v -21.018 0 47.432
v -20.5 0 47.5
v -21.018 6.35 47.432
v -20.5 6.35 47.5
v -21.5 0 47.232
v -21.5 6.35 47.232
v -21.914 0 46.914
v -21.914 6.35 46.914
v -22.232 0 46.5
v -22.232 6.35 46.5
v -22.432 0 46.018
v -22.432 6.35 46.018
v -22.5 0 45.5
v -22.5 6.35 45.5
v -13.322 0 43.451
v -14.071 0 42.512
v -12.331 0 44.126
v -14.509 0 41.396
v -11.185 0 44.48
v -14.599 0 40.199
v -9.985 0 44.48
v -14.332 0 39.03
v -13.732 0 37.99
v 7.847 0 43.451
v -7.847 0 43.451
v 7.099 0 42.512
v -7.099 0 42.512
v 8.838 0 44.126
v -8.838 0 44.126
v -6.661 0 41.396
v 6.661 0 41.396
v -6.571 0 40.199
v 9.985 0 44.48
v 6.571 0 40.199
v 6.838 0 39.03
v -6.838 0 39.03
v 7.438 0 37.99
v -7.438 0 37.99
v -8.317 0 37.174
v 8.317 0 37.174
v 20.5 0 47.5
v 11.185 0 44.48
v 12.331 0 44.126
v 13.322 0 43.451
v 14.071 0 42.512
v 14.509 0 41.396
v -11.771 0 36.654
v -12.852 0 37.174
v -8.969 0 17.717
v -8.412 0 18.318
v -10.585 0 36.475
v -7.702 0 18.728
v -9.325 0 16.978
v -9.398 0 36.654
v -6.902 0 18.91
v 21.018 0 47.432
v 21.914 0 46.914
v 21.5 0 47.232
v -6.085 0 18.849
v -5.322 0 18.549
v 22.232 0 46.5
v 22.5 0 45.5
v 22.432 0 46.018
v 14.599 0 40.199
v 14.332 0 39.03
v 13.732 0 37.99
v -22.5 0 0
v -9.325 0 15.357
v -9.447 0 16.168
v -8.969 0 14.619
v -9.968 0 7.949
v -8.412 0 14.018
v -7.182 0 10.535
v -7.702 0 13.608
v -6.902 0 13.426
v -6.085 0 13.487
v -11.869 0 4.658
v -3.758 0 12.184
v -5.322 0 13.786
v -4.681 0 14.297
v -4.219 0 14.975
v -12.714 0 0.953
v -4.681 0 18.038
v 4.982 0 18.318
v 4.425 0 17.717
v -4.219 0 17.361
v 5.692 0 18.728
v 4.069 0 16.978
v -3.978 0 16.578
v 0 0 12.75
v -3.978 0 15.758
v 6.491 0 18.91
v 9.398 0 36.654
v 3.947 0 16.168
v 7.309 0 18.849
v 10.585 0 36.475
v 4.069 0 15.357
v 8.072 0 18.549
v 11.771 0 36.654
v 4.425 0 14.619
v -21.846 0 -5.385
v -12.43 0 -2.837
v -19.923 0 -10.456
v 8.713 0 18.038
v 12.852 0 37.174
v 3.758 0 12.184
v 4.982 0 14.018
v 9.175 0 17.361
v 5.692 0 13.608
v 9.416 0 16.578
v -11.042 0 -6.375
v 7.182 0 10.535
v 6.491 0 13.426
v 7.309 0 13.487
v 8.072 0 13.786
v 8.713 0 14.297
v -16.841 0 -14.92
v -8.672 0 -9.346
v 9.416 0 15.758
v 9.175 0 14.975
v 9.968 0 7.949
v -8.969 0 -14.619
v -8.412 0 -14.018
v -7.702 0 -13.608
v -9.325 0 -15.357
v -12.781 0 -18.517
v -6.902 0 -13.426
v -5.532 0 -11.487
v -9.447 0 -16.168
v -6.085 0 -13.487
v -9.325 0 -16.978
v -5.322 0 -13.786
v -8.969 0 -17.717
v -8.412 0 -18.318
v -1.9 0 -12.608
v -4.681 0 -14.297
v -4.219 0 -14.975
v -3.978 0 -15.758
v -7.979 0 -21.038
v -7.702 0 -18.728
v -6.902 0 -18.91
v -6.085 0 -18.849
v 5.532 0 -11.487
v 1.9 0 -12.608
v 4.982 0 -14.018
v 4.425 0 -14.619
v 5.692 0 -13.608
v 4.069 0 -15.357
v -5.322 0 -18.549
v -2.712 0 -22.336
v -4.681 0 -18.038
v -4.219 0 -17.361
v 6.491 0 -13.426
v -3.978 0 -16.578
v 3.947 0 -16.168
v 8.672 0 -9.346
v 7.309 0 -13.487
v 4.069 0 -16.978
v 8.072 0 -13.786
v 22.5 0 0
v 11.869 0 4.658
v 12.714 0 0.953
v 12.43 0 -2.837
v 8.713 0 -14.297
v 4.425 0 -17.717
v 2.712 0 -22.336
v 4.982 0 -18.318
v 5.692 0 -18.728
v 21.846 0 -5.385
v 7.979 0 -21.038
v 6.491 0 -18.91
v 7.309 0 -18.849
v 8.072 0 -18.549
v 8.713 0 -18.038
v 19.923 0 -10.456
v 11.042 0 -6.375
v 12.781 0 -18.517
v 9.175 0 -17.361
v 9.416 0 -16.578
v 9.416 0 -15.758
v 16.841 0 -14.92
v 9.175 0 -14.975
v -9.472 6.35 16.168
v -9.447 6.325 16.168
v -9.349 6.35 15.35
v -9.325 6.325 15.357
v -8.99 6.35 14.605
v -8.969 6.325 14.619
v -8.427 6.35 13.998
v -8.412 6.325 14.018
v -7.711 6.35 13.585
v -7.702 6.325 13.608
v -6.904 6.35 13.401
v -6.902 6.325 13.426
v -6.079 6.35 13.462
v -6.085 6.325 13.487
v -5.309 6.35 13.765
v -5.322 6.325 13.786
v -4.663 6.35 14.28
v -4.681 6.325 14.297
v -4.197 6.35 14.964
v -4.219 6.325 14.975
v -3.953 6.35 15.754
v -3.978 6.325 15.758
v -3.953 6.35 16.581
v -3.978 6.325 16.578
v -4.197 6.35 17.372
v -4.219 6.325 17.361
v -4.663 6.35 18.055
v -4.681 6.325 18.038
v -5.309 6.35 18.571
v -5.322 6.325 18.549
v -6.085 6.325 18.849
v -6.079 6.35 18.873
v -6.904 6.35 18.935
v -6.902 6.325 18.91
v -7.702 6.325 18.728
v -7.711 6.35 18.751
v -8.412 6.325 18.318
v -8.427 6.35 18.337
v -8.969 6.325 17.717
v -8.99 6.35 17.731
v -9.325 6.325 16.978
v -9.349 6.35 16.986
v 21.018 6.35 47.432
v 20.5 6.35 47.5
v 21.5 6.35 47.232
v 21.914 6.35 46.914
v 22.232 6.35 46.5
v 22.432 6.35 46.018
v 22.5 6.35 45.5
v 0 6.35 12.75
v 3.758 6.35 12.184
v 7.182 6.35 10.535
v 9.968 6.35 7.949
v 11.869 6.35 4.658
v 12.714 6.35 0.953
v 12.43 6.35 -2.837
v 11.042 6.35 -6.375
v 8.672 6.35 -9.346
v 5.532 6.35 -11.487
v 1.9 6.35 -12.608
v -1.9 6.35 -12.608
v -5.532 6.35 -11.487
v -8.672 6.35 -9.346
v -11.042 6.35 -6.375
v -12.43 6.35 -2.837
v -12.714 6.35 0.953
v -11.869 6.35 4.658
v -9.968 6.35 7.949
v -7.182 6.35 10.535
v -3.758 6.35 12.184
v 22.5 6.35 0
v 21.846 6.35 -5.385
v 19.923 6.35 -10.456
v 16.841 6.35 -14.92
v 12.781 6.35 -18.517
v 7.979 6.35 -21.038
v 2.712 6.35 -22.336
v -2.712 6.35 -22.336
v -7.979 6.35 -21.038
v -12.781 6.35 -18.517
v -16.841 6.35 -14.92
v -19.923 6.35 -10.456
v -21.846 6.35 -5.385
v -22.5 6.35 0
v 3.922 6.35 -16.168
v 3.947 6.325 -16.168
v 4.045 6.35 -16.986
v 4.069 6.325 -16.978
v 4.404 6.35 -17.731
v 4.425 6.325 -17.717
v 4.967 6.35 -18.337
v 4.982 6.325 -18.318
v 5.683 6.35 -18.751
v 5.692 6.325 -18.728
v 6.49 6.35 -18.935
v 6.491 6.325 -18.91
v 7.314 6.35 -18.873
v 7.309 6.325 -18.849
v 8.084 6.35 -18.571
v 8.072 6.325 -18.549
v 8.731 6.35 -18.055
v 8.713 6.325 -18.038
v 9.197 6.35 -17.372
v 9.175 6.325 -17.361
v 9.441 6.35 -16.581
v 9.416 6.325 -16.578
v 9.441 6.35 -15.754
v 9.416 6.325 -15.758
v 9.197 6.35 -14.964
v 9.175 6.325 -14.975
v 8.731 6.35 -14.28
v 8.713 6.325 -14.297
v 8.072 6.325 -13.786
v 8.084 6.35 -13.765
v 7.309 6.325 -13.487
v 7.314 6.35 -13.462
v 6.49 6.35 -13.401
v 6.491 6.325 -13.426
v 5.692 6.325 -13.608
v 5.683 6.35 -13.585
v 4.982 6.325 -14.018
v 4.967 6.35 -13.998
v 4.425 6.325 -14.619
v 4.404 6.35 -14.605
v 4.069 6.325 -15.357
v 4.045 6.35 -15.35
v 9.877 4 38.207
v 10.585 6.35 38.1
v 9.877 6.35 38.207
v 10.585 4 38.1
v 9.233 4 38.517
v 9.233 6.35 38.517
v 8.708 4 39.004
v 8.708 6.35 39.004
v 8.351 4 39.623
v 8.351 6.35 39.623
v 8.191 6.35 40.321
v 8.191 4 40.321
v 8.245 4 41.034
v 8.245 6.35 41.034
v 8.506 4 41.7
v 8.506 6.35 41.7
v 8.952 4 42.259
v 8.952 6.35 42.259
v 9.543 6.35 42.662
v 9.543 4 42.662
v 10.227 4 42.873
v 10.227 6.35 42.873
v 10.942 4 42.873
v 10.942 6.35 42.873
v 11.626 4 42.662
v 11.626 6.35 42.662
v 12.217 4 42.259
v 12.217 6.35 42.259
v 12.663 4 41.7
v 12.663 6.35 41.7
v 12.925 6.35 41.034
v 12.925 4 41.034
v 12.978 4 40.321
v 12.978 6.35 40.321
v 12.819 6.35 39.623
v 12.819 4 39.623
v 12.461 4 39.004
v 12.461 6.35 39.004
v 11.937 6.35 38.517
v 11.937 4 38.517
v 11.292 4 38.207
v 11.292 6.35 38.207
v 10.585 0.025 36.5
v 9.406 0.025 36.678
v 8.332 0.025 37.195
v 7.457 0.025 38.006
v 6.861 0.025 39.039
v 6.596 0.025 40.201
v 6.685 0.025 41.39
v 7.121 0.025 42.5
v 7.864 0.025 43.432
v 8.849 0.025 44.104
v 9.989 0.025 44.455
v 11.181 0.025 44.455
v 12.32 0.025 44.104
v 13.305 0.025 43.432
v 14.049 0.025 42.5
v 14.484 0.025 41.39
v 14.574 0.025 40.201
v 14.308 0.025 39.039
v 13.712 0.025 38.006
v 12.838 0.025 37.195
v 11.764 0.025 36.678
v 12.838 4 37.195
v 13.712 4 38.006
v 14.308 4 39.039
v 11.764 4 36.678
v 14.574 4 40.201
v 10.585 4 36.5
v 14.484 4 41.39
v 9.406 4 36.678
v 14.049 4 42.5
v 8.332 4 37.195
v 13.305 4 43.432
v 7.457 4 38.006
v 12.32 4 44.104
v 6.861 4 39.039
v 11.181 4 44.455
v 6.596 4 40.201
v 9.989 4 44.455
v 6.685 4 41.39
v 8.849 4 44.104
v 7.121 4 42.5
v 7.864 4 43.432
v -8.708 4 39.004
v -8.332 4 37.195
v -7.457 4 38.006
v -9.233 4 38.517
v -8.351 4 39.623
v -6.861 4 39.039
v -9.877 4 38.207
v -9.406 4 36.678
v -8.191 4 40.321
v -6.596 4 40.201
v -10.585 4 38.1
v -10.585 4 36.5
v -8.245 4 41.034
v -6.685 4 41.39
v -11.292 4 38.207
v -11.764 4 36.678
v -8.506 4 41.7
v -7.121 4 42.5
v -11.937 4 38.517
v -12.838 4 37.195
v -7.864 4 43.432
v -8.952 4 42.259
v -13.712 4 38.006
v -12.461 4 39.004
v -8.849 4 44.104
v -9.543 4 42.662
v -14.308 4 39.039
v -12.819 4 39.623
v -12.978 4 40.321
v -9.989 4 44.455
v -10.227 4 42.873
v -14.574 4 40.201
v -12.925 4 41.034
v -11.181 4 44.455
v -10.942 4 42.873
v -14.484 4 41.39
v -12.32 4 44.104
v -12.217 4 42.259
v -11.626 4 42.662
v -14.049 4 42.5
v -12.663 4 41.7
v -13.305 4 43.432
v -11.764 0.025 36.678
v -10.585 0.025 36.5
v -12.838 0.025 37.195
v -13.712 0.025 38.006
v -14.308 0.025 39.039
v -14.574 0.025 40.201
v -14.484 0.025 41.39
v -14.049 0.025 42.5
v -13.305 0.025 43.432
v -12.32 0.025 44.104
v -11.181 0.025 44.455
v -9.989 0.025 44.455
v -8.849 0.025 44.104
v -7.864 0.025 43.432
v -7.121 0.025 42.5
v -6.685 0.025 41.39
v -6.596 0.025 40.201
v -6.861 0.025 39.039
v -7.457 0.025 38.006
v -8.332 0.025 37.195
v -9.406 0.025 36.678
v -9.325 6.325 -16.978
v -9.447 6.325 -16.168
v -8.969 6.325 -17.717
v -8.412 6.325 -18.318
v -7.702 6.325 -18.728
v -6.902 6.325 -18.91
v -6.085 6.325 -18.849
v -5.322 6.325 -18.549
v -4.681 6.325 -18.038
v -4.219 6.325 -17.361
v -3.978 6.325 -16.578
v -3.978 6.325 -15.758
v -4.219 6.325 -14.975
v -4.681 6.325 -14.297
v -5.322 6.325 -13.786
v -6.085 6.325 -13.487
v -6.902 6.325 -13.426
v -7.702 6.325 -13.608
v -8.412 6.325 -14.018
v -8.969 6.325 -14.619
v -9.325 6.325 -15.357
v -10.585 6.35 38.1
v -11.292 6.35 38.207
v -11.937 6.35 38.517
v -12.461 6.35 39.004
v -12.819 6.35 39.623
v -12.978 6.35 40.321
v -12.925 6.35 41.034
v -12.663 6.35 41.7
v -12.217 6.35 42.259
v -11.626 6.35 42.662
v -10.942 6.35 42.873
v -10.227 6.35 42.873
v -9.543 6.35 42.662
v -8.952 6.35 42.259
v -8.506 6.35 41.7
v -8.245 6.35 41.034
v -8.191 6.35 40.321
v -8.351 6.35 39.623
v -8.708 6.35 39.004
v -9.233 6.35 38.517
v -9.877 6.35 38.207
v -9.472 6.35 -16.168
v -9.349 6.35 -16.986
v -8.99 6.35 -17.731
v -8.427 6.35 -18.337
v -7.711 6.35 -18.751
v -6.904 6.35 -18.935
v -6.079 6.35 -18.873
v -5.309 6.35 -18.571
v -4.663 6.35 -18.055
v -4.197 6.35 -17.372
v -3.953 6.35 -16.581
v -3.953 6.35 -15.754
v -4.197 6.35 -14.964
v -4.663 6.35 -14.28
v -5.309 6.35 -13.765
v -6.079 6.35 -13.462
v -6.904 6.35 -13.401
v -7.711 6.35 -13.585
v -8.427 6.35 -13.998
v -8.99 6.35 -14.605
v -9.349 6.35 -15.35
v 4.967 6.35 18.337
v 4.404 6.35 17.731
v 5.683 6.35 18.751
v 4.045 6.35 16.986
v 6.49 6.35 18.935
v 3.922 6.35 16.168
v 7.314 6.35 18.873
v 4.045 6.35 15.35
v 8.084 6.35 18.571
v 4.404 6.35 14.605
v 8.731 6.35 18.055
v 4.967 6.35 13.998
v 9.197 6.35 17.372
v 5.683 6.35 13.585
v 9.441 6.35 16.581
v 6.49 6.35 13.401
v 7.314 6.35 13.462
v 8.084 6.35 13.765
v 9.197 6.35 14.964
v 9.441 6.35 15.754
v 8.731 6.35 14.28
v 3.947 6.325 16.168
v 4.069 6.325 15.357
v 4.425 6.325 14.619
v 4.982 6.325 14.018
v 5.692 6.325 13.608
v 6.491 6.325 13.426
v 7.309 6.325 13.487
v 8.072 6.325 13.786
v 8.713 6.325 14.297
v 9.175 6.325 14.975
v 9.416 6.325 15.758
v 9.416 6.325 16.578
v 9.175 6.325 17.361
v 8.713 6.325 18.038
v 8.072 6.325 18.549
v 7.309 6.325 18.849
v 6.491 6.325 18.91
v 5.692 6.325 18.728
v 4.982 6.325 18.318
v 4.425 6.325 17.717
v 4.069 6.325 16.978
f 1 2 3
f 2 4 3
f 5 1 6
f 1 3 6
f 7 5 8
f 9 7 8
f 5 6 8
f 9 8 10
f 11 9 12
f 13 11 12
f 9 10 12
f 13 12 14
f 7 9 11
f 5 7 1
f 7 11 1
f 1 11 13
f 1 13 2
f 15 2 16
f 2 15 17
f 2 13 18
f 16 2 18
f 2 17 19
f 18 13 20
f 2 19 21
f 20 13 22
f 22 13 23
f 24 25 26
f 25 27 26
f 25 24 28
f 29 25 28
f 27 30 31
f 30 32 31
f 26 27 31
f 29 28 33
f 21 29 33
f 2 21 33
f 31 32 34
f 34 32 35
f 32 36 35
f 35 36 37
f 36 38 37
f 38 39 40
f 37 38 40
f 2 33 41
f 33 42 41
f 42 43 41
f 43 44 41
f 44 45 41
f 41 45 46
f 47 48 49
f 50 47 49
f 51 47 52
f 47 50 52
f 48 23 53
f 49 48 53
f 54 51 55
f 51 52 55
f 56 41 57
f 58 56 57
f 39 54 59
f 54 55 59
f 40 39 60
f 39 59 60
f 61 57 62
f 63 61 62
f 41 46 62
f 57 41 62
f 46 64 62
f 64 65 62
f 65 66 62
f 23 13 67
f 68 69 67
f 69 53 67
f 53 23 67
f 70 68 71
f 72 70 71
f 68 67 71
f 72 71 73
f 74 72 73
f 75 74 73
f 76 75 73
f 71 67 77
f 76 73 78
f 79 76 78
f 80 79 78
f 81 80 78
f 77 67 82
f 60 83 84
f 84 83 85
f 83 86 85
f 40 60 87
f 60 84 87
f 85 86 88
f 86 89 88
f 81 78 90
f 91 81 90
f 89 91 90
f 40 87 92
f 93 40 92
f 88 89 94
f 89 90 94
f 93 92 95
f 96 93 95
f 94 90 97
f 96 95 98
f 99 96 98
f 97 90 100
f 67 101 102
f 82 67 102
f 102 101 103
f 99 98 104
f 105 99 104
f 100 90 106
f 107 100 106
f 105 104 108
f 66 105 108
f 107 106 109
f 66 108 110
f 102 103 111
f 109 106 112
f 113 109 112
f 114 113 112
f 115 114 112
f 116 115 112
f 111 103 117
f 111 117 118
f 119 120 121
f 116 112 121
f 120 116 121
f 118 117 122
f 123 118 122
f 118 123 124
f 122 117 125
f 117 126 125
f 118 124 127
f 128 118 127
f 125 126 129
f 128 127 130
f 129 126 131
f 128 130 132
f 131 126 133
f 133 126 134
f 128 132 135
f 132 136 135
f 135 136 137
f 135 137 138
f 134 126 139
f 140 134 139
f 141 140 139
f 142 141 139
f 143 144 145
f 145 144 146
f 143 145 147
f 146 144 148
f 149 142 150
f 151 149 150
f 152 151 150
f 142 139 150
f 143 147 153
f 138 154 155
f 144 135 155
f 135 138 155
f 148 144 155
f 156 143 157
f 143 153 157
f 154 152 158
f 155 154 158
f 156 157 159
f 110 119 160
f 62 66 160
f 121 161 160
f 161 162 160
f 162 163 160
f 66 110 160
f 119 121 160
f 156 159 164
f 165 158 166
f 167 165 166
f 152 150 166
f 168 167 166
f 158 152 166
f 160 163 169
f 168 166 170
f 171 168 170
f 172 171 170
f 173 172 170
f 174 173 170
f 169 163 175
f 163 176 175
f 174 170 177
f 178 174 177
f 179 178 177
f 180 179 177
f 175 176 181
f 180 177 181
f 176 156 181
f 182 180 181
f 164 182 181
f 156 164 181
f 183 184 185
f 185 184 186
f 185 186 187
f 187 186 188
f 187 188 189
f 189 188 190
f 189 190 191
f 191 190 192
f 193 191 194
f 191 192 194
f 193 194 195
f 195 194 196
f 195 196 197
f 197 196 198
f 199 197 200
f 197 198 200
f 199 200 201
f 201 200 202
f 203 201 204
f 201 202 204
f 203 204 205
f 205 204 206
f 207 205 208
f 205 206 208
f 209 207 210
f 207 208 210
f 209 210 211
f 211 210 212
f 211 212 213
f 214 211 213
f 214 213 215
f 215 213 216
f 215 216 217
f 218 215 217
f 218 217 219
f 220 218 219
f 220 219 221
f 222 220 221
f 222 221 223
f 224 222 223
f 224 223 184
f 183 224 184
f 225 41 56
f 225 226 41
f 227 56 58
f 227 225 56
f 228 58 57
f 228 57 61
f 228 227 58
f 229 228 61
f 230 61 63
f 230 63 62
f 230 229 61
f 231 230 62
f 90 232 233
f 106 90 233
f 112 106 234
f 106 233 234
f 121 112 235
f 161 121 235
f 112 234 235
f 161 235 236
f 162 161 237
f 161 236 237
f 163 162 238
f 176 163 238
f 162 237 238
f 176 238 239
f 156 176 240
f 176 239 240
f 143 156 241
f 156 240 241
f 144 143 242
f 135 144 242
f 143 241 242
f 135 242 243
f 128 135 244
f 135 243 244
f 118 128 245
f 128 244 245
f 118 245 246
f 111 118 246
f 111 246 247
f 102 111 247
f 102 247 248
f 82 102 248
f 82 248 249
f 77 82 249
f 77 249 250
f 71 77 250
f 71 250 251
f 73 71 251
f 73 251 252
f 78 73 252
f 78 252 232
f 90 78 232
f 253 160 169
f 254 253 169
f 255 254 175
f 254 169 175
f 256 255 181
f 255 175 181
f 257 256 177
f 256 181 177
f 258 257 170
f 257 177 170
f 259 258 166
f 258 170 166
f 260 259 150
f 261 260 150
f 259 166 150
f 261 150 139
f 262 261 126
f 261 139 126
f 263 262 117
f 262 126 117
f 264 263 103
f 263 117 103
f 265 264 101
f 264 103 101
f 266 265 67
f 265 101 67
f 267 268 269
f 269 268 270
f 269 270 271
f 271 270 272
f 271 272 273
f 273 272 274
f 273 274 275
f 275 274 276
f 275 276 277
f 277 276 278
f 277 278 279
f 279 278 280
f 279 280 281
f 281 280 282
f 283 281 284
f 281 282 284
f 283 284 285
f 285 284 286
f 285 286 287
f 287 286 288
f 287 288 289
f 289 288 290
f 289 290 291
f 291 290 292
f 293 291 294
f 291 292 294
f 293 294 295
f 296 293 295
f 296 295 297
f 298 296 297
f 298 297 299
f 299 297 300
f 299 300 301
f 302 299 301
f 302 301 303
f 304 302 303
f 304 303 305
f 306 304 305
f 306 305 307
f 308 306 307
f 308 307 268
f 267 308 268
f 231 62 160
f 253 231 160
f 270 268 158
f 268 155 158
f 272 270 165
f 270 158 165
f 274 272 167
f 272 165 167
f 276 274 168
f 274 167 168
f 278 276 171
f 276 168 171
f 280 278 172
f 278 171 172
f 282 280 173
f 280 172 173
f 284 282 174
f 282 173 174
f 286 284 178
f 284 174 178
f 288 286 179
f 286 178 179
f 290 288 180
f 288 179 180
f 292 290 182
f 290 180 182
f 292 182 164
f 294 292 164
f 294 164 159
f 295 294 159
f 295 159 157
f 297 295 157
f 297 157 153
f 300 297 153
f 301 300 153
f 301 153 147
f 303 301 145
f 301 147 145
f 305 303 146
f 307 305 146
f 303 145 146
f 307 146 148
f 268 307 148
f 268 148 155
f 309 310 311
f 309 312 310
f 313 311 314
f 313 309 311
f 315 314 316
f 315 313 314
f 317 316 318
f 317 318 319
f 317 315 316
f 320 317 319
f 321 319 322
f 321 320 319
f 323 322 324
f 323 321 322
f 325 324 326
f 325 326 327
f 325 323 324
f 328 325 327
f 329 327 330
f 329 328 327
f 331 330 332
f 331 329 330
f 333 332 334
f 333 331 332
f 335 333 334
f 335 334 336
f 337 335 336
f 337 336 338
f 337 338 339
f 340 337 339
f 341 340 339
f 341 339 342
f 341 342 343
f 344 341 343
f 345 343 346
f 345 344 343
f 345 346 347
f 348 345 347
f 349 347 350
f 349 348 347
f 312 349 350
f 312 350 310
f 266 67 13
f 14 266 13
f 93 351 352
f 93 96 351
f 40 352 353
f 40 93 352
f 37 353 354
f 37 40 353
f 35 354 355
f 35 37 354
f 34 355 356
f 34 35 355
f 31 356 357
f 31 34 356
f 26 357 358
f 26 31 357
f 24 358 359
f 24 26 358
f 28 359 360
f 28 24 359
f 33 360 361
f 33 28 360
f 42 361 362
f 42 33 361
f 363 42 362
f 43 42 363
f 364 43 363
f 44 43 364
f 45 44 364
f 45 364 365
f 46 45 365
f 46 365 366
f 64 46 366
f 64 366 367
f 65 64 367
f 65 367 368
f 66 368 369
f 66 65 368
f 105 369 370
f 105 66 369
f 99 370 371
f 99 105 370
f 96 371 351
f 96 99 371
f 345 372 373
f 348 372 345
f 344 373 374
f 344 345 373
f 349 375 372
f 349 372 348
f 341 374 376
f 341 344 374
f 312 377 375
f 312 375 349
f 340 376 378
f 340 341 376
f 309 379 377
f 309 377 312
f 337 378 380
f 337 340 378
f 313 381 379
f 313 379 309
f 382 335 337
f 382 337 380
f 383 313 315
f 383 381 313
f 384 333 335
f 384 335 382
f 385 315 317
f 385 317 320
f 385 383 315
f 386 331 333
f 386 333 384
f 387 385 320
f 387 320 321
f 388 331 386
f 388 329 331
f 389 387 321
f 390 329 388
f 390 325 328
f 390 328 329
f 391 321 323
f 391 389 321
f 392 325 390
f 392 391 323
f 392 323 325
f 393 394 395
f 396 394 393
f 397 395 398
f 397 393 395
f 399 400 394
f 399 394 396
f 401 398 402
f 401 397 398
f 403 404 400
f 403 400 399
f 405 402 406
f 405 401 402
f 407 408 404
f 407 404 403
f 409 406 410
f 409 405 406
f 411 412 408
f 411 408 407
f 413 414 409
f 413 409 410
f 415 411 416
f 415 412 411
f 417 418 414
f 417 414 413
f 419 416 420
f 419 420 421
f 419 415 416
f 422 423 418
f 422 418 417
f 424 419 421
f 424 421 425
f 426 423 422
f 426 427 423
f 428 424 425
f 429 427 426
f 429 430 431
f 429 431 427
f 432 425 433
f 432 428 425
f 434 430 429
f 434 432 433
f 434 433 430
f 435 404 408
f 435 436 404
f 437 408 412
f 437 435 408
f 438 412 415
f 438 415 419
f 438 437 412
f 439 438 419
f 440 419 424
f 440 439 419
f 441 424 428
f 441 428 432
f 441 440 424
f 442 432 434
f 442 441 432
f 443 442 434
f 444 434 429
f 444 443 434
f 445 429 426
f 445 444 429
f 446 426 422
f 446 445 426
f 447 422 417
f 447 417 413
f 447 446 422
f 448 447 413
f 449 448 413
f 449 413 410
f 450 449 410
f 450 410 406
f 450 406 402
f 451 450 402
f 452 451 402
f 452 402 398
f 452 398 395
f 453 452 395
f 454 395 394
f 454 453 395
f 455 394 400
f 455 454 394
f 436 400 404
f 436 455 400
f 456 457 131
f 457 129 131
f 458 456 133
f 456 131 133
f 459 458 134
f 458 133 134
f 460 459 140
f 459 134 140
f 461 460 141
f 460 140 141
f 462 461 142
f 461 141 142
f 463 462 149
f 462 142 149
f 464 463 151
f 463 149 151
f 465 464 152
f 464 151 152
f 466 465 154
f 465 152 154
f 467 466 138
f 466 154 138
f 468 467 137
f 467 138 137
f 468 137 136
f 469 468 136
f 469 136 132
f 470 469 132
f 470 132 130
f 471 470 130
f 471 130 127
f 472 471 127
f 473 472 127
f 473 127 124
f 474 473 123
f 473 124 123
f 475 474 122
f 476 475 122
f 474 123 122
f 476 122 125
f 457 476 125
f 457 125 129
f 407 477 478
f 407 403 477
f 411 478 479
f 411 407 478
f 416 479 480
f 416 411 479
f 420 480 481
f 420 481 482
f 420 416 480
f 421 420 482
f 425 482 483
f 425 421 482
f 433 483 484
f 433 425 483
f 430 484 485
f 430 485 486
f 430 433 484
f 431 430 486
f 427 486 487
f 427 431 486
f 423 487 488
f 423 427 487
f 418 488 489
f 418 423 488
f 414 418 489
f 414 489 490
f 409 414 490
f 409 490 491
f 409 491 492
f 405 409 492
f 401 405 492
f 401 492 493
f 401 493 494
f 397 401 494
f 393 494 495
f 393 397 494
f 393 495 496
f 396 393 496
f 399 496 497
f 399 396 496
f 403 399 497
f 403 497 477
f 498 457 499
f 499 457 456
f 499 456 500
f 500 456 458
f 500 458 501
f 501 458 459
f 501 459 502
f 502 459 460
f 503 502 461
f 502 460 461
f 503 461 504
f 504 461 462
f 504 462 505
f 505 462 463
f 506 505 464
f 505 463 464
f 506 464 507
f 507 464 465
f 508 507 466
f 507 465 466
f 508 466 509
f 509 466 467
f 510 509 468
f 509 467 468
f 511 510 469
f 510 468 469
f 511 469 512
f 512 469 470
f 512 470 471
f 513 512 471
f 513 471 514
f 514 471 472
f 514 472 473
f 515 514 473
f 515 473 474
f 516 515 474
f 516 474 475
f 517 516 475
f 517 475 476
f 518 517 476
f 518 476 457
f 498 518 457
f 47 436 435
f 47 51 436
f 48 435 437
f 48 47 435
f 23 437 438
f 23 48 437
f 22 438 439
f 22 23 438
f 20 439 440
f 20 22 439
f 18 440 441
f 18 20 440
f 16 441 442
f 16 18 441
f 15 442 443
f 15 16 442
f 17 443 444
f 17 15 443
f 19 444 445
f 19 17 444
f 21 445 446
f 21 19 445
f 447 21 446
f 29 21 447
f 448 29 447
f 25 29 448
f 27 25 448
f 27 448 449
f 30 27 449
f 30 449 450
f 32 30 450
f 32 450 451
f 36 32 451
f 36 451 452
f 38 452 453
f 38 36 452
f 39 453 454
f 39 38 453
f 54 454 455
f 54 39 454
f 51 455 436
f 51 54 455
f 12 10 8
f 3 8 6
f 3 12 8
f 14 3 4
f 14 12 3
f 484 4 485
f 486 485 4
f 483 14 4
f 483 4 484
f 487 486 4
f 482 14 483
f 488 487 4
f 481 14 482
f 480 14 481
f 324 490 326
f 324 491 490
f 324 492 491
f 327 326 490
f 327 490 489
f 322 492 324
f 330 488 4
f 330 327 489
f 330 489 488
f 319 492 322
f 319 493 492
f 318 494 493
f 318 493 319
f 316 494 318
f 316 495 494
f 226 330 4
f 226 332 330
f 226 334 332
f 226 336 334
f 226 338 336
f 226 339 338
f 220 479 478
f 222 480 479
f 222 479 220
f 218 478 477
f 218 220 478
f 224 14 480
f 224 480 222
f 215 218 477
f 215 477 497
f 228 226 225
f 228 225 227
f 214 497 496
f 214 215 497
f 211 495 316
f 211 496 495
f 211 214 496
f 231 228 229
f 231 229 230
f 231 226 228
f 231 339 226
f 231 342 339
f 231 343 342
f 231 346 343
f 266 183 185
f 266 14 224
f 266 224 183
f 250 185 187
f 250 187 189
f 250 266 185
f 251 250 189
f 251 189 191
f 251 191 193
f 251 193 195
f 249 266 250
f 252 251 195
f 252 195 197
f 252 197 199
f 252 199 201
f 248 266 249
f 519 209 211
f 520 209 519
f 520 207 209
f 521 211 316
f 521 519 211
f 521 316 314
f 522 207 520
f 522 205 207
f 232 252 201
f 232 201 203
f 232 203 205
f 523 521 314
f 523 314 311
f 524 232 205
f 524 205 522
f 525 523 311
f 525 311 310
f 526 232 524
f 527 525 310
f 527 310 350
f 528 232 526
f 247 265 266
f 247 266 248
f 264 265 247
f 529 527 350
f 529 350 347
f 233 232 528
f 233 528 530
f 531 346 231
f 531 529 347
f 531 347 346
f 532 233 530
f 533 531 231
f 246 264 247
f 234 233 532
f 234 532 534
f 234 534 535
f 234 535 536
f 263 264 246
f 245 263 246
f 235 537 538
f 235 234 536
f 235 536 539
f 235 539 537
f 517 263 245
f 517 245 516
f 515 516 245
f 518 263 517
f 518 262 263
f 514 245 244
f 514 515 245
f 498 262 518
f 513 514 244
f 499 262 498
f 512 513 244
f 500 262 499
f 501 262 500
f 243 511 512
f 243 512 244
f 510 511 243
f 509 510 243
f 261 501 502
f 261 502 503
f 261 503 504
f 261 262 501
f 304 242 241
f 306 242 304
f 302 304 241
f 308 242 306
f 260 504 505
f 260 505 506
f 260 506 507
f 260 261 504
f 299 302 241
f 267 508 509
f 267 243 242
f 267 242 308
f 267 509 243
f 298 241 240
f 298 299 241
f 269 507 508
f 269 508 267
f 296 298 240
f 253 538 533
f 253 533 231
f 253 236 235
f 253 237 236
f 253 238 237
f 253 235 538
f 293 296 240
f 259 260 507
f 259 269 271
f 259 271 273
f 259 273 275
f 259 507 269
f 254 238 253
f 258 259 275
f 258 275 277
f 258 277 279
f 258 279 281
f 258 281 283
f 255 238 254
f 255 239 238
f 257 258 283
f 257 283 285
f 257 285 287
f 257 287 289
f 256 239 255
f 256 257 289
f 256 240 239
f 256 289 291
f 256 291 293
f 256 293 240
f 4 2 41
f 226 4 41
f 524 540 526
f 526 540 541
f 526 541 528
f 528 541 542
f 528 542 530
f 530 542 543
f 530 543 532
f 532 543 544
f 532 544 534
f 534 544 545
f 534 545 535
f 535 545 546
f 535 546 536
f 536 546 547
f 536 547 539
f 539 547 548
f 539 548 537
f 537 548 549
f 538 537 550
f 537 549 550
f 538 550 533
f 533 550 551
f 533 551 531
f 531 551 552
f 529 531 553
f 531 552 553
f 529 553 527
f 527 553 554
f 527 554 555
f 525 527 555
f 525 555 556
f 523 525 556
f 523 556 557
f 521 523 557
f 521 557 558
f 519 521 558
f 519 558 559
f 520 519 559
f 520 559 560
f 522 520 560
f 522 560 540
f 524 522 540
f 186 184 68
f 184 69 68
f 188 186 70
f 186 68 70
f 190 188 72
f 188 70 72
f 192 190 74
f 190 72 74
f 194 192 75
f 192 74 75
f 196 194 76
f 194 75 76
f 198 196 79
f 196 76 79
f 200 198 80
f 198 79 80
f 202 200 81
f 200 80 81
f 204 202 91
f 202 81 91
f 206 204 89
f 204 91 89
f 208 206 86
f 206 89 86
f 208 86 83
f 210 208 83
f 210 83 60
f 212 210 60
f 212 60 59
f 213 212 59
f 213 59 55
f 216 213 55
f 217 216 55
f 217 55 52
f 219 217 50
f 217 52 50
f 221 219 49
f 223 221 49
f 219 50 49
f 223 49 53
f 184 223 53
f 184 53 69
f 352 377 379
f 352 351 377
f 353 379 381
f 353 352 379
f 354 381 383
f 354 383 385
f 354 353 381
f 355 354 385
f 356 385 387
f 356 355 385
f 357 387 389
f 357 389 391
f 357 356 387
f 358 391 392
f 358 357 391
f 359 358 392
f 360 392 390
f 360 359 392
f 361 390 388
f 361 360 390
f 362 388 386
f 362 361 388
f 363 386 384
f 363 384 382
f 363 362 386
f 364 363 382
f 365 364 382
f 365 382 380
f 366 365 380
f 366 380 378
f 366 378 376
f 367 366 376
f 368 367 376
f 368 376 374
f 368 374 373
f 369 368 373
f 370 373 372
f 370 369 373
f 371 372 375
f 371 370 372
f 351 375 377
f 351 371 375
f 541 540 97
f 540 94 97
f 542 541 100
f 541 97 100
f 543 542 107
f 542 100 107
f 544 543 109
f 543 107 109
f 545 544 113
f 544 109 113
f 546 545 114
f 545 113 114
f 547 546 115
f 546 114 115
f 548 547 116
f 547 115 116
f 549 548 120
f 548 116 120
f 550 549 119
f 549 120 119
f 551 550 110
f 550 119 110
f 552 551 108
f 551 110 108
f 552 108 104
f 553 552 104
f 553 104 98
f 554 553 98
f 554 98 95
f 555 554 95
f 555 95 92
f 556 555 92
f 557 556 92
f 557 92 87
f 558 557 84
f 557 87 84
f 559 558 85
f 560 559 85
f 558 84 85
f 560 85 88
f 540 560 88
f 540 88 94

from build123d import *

# Parameters (mm, degrees)
BOSS_EXTRUDE1_DEPTH            = 6.35
M5_CLEARANCE_HOLE1_D           = 5.5
M5_CLEARANCE_HOLE1_CSINK_D     = 5.55
M5_CLEARANCE_HOLE1_CSINK_ANGLE = 90
SKETCH5_R                      = 12.75
CUT_EXTRUDE1_DEPTH             = 53.941689622
CBORE_FOR_M4_SHCS1_AT_2_COUNT  = 2
CBORE_FOR_M4_SHCS1_AT_2_PITCH  = 21.169571299
FILLET1_R                      = 2


with BuildPart() as part:
    # Sketch1 → Boss-Extrude1 (new body)
    with BuildSketch(Plane(origin=(0, 0, 0), x_dir=(1, 0, 0), z_dir=(0, 1, 0))):
        with BuildLine():
            Line((-22.5, -47.5), (22.5, -47.5))
            Line((22.5, -47.5), (22.5, 3.34e-07))
            ThreePointArc((22.5, 3.34e-07), (0, 22.5), (-22.5, 3.34e-07))
            Line((-22.5, 3.34e-07), (-22.5, -47.5))
        make_face()
    extrude(amount=BOSS_EXTRUDE1_DEPTH)

    # M5 Clearance Hole1 (through all)
    with Locations(Plane(origin=(0, 6.35, 0), x_dir=(1, 0, 0), z_dir=(0, 1, 0))):
        with Locations((-6.696960066, -16.167891819), (6.696960066, -16.167891819), (6.696960066, 16.167891819), (-6.696960066, 16.167891819)):
            CounterSinkHole(M5_CLEARANCE_HOLE1_D / 2, M5_CLEARANCE_HOLE1_CSINK_D / 2, counter_sink_angle=M5_CLEARANCE_HOLE1_CSINK_ANGLE)

    # Sketch5 → Cut-Extrude1 (cut, through all)
    with BuildSketch(Plane(origin=(0, 6.35, 0), x_dir=(1, 0, 0), z_dir=(0, 1, 0))):
        with Locations(Location((0, 0, 0), (0, 0, 270))):
            Circle(SKETCH5_R)
    extrude(amount=-CUT_EXTRUDE1_DEPTH, mode=Mode.SUBTRACT)

    # Sketch10 → CBORE for M4 SHCS1 (revolve, cut)
    with BuildSketch(Plane(origin=(10.584785649, 0, 40.5), x_dir=(0, 0, -1), z_dir=(1, 0, 0))):
        Polygon((0, 0), (0, 6.35), (2.4, 6.35), (2.4, 4), (4, 4), (4, 0.025), (4.025, 0), align=None)
    cbore_for_m4_shcs1 = revolve(axis=Axis((10.584785649, -6.35, 40.5), (0, 1, 0)), mode=Mode.SUBTRACT)

    # CBORE for M4 SHCS1 at 2: CBORE for M4 SHCS1 ×2
    with Locations(*[(-i * CBORE_FOR_M4_SHCS1_AT_2_PITCH, 0, 0) for i in range(1, CBORE_FOR_M4_SHCS1_AT_2_COUNT)]):
        add(cbore_for_m4_shcs1, mode=Mode.SUBTRACT)

    # Fillet1
    fillet1_edges = [part.edges().sort_by_distance(p)[0] for p in [
        (22.5, 3.175, 47.5),
        (-22.5, 3.175, 47.5),
    ]]
    fillet(fillet1_edges, radius=FILLET1_R)


solid = part.part
